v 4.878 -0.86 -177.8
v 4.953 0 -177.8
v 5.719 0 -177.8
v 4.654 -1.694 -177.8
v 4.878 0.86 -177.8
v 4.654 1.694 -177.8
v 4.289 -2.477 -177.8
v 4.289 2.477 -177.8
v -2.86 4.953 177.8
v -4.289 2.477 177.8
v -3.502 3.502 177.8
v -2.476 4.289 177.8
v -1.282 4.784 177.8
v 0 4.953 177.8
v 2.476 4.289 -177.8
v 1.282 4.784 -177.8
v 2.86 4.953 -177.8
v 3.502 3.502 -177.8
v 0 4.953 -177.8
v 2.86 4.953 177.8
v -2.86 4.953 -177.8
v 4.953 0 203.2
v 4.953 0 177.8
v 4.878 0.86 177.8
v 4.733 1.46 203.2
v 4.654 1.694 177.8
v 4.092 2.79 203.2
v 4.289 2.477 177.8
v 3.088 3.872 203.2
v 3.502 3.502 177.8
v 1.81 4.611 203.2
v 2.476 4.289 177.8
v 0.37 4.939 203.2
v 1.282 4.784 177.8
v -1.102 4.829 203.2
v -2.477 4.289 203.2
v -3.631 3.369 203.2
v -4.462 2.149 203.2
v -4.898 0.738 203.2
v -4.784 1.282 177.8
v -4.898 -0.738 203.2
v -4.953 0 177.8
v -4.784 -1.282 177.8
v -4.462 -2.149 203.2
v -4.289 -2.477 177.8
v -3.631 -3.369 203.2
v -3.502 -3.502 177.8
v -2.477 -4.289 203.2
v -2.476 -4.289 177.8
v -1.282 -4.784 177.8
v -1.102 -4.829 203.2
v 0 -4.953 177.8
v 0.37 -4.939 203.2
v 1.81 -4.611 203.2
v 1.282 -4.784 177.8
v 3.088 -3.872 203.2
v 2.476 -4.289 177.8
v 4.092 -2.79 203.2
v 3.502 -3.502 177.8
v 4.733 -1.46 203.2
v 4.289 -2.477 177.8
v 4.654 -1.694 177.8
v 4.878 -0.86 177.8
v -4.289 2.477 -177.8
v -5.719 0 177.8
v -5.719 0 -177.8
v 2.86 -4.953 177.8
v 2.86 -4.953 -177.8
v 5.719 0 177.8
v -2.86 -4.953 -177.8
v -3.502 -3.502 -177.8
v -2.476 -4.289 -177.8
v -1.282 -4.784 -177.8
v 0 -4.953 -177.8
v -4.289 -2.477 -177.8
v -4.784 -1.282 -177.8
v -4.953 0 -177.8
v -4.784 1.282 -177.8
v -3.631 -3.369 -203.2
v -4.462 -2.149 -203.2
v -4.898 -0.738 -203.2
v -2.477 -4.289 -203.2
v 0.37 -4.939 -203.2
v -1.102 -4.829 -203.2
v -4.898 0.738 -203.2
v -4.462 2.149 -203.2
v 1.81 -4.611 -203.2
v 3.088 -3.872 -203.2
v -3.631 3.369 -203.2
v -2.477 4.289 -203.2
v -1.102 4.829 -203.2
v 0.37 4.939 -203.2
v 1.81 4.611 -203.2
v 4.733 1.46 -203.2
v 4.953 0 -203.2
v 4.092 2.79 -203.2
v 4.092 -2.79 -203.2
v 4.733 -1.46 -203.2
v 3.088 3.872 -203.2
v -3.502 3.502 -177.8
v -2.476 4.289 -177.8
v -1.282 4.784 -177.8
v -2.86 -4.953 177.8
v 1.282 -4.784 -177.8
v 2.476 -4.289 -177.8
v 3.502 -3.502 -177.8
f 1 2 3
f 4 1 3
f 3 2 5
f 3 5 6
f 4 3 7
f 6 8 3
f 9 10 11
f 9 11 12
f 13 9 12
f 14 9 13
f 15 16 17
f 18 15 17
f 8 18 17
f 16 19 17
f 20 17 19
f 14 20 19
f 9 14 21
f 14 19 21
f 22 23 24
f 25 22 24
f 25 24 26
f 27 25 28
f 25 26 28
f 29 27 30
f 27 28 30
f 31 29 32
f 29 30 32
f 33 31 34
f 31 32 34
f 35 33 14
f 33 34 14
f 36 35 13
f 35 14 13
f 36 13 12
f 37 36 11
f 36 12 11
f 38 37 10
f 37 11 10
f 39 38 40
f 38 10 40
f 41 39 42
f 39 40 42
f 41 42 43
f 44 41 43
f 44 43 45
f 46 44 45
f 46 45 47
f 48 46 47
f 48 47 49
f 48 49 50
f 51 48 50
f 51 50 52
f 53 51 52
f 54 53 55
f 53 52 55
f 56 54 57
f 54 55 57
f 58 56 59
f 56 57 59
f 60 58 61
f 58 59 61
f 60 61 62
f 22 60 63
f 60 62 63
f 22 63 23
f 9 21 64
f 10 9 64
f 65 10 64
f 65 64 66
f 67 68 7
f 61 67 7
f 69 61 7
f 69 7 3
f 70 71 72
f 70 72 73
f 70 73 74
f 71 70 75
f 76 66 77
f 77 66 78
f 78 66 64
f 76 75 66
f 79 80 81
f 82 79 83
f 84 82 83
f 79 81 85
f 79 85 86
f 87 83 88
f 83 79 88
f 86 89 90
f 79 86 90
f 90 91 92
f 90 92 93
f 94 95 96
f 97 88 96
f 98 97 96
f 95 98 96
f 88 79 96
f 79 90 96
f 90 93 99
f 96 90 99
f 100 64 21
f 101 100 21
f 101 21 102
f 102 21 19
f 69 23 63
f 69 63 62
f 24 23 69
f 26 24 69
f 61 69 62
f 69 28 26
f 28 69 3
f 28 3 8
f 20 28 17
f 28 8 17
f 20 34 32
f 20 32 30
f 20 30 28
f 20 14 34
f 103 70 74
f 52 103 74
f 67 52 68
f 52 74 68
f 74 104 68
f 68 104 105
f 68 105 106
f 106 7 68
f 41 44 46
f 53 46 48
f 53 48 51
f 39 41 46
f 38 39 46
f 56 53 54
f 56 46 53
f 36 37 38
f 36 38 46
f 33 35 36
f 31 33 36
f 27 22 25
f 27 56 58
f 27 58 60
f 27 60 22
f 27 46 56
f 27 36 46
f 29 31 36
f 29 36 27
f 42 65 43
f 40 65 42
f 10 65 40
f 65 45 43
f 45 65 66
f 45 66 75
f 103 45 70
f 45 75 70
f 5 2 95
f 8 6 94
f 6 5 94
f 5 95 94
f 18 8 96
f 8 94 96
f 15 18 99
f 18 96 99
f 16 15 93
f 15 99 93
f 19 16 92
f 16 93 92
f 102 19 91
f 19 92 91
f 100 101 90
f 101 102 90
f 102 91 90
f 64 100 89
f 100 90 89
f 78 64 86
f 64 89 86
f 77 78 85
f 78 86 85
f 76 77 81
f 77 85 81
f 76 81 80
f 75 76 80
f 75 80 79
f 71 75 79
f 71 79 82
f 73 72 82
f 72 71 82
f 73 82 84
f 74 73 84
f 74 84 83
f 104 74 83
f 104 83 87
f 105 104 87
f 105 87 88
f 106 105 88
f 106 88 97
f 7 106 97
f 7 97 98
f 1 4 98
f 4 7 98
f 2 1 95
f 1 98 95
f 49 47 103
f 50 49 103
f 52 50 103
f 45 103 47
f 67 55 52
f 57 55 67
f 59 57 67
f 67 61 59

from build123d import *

# Parameters (mm, degrees)
BOSS_EXTRUDE1_DEPTH      = 203.2
BOSS_EXTRUDE1_DEPTH_BACK = 203.2
SKETCH1_R                = 4.953
BOSS_EXTRUDE2_DEPTH      = 177.8
BOSS_EXTRUDE2_DEPTH_BACK = 177.8


with BuildPart() as part:
    # Sketch1 → Boss-Extrude1 (new, two sides: drawn at the far end of the back side and taken through both)
    with BuildSketch(Plane.XY.offset(-BOSS_EXTRUDE1_DEPTH_BACK)):
        Circle(SKETCH1_R)
    extrude(amount=BOSS_EXTRUDE1_DEPTH + BOSS_EXTRUDE1_DEPTH_BACK)

    # Sketch2 → Boss-Extrude2 (add, two sides: drawn at the far end of the back side and taken through both)
    with BuildSketch(Plane.XY.offset(-BOSS_EXTRUDE2_DEPTH_BACK)):
        Polygon((5.719231767, 0), (2.859615883, 4.953), (-2.859615883, 4.953), (-5.719231767, 0), (-2.859615883, -4.953), (2.859615883, -4.953), align=None)
    extrude(amount=BOSS_EXTRUDE2_DEPTH + BOSS_EXTRUDE2_DEPTH_BACK)


solid = part.part
